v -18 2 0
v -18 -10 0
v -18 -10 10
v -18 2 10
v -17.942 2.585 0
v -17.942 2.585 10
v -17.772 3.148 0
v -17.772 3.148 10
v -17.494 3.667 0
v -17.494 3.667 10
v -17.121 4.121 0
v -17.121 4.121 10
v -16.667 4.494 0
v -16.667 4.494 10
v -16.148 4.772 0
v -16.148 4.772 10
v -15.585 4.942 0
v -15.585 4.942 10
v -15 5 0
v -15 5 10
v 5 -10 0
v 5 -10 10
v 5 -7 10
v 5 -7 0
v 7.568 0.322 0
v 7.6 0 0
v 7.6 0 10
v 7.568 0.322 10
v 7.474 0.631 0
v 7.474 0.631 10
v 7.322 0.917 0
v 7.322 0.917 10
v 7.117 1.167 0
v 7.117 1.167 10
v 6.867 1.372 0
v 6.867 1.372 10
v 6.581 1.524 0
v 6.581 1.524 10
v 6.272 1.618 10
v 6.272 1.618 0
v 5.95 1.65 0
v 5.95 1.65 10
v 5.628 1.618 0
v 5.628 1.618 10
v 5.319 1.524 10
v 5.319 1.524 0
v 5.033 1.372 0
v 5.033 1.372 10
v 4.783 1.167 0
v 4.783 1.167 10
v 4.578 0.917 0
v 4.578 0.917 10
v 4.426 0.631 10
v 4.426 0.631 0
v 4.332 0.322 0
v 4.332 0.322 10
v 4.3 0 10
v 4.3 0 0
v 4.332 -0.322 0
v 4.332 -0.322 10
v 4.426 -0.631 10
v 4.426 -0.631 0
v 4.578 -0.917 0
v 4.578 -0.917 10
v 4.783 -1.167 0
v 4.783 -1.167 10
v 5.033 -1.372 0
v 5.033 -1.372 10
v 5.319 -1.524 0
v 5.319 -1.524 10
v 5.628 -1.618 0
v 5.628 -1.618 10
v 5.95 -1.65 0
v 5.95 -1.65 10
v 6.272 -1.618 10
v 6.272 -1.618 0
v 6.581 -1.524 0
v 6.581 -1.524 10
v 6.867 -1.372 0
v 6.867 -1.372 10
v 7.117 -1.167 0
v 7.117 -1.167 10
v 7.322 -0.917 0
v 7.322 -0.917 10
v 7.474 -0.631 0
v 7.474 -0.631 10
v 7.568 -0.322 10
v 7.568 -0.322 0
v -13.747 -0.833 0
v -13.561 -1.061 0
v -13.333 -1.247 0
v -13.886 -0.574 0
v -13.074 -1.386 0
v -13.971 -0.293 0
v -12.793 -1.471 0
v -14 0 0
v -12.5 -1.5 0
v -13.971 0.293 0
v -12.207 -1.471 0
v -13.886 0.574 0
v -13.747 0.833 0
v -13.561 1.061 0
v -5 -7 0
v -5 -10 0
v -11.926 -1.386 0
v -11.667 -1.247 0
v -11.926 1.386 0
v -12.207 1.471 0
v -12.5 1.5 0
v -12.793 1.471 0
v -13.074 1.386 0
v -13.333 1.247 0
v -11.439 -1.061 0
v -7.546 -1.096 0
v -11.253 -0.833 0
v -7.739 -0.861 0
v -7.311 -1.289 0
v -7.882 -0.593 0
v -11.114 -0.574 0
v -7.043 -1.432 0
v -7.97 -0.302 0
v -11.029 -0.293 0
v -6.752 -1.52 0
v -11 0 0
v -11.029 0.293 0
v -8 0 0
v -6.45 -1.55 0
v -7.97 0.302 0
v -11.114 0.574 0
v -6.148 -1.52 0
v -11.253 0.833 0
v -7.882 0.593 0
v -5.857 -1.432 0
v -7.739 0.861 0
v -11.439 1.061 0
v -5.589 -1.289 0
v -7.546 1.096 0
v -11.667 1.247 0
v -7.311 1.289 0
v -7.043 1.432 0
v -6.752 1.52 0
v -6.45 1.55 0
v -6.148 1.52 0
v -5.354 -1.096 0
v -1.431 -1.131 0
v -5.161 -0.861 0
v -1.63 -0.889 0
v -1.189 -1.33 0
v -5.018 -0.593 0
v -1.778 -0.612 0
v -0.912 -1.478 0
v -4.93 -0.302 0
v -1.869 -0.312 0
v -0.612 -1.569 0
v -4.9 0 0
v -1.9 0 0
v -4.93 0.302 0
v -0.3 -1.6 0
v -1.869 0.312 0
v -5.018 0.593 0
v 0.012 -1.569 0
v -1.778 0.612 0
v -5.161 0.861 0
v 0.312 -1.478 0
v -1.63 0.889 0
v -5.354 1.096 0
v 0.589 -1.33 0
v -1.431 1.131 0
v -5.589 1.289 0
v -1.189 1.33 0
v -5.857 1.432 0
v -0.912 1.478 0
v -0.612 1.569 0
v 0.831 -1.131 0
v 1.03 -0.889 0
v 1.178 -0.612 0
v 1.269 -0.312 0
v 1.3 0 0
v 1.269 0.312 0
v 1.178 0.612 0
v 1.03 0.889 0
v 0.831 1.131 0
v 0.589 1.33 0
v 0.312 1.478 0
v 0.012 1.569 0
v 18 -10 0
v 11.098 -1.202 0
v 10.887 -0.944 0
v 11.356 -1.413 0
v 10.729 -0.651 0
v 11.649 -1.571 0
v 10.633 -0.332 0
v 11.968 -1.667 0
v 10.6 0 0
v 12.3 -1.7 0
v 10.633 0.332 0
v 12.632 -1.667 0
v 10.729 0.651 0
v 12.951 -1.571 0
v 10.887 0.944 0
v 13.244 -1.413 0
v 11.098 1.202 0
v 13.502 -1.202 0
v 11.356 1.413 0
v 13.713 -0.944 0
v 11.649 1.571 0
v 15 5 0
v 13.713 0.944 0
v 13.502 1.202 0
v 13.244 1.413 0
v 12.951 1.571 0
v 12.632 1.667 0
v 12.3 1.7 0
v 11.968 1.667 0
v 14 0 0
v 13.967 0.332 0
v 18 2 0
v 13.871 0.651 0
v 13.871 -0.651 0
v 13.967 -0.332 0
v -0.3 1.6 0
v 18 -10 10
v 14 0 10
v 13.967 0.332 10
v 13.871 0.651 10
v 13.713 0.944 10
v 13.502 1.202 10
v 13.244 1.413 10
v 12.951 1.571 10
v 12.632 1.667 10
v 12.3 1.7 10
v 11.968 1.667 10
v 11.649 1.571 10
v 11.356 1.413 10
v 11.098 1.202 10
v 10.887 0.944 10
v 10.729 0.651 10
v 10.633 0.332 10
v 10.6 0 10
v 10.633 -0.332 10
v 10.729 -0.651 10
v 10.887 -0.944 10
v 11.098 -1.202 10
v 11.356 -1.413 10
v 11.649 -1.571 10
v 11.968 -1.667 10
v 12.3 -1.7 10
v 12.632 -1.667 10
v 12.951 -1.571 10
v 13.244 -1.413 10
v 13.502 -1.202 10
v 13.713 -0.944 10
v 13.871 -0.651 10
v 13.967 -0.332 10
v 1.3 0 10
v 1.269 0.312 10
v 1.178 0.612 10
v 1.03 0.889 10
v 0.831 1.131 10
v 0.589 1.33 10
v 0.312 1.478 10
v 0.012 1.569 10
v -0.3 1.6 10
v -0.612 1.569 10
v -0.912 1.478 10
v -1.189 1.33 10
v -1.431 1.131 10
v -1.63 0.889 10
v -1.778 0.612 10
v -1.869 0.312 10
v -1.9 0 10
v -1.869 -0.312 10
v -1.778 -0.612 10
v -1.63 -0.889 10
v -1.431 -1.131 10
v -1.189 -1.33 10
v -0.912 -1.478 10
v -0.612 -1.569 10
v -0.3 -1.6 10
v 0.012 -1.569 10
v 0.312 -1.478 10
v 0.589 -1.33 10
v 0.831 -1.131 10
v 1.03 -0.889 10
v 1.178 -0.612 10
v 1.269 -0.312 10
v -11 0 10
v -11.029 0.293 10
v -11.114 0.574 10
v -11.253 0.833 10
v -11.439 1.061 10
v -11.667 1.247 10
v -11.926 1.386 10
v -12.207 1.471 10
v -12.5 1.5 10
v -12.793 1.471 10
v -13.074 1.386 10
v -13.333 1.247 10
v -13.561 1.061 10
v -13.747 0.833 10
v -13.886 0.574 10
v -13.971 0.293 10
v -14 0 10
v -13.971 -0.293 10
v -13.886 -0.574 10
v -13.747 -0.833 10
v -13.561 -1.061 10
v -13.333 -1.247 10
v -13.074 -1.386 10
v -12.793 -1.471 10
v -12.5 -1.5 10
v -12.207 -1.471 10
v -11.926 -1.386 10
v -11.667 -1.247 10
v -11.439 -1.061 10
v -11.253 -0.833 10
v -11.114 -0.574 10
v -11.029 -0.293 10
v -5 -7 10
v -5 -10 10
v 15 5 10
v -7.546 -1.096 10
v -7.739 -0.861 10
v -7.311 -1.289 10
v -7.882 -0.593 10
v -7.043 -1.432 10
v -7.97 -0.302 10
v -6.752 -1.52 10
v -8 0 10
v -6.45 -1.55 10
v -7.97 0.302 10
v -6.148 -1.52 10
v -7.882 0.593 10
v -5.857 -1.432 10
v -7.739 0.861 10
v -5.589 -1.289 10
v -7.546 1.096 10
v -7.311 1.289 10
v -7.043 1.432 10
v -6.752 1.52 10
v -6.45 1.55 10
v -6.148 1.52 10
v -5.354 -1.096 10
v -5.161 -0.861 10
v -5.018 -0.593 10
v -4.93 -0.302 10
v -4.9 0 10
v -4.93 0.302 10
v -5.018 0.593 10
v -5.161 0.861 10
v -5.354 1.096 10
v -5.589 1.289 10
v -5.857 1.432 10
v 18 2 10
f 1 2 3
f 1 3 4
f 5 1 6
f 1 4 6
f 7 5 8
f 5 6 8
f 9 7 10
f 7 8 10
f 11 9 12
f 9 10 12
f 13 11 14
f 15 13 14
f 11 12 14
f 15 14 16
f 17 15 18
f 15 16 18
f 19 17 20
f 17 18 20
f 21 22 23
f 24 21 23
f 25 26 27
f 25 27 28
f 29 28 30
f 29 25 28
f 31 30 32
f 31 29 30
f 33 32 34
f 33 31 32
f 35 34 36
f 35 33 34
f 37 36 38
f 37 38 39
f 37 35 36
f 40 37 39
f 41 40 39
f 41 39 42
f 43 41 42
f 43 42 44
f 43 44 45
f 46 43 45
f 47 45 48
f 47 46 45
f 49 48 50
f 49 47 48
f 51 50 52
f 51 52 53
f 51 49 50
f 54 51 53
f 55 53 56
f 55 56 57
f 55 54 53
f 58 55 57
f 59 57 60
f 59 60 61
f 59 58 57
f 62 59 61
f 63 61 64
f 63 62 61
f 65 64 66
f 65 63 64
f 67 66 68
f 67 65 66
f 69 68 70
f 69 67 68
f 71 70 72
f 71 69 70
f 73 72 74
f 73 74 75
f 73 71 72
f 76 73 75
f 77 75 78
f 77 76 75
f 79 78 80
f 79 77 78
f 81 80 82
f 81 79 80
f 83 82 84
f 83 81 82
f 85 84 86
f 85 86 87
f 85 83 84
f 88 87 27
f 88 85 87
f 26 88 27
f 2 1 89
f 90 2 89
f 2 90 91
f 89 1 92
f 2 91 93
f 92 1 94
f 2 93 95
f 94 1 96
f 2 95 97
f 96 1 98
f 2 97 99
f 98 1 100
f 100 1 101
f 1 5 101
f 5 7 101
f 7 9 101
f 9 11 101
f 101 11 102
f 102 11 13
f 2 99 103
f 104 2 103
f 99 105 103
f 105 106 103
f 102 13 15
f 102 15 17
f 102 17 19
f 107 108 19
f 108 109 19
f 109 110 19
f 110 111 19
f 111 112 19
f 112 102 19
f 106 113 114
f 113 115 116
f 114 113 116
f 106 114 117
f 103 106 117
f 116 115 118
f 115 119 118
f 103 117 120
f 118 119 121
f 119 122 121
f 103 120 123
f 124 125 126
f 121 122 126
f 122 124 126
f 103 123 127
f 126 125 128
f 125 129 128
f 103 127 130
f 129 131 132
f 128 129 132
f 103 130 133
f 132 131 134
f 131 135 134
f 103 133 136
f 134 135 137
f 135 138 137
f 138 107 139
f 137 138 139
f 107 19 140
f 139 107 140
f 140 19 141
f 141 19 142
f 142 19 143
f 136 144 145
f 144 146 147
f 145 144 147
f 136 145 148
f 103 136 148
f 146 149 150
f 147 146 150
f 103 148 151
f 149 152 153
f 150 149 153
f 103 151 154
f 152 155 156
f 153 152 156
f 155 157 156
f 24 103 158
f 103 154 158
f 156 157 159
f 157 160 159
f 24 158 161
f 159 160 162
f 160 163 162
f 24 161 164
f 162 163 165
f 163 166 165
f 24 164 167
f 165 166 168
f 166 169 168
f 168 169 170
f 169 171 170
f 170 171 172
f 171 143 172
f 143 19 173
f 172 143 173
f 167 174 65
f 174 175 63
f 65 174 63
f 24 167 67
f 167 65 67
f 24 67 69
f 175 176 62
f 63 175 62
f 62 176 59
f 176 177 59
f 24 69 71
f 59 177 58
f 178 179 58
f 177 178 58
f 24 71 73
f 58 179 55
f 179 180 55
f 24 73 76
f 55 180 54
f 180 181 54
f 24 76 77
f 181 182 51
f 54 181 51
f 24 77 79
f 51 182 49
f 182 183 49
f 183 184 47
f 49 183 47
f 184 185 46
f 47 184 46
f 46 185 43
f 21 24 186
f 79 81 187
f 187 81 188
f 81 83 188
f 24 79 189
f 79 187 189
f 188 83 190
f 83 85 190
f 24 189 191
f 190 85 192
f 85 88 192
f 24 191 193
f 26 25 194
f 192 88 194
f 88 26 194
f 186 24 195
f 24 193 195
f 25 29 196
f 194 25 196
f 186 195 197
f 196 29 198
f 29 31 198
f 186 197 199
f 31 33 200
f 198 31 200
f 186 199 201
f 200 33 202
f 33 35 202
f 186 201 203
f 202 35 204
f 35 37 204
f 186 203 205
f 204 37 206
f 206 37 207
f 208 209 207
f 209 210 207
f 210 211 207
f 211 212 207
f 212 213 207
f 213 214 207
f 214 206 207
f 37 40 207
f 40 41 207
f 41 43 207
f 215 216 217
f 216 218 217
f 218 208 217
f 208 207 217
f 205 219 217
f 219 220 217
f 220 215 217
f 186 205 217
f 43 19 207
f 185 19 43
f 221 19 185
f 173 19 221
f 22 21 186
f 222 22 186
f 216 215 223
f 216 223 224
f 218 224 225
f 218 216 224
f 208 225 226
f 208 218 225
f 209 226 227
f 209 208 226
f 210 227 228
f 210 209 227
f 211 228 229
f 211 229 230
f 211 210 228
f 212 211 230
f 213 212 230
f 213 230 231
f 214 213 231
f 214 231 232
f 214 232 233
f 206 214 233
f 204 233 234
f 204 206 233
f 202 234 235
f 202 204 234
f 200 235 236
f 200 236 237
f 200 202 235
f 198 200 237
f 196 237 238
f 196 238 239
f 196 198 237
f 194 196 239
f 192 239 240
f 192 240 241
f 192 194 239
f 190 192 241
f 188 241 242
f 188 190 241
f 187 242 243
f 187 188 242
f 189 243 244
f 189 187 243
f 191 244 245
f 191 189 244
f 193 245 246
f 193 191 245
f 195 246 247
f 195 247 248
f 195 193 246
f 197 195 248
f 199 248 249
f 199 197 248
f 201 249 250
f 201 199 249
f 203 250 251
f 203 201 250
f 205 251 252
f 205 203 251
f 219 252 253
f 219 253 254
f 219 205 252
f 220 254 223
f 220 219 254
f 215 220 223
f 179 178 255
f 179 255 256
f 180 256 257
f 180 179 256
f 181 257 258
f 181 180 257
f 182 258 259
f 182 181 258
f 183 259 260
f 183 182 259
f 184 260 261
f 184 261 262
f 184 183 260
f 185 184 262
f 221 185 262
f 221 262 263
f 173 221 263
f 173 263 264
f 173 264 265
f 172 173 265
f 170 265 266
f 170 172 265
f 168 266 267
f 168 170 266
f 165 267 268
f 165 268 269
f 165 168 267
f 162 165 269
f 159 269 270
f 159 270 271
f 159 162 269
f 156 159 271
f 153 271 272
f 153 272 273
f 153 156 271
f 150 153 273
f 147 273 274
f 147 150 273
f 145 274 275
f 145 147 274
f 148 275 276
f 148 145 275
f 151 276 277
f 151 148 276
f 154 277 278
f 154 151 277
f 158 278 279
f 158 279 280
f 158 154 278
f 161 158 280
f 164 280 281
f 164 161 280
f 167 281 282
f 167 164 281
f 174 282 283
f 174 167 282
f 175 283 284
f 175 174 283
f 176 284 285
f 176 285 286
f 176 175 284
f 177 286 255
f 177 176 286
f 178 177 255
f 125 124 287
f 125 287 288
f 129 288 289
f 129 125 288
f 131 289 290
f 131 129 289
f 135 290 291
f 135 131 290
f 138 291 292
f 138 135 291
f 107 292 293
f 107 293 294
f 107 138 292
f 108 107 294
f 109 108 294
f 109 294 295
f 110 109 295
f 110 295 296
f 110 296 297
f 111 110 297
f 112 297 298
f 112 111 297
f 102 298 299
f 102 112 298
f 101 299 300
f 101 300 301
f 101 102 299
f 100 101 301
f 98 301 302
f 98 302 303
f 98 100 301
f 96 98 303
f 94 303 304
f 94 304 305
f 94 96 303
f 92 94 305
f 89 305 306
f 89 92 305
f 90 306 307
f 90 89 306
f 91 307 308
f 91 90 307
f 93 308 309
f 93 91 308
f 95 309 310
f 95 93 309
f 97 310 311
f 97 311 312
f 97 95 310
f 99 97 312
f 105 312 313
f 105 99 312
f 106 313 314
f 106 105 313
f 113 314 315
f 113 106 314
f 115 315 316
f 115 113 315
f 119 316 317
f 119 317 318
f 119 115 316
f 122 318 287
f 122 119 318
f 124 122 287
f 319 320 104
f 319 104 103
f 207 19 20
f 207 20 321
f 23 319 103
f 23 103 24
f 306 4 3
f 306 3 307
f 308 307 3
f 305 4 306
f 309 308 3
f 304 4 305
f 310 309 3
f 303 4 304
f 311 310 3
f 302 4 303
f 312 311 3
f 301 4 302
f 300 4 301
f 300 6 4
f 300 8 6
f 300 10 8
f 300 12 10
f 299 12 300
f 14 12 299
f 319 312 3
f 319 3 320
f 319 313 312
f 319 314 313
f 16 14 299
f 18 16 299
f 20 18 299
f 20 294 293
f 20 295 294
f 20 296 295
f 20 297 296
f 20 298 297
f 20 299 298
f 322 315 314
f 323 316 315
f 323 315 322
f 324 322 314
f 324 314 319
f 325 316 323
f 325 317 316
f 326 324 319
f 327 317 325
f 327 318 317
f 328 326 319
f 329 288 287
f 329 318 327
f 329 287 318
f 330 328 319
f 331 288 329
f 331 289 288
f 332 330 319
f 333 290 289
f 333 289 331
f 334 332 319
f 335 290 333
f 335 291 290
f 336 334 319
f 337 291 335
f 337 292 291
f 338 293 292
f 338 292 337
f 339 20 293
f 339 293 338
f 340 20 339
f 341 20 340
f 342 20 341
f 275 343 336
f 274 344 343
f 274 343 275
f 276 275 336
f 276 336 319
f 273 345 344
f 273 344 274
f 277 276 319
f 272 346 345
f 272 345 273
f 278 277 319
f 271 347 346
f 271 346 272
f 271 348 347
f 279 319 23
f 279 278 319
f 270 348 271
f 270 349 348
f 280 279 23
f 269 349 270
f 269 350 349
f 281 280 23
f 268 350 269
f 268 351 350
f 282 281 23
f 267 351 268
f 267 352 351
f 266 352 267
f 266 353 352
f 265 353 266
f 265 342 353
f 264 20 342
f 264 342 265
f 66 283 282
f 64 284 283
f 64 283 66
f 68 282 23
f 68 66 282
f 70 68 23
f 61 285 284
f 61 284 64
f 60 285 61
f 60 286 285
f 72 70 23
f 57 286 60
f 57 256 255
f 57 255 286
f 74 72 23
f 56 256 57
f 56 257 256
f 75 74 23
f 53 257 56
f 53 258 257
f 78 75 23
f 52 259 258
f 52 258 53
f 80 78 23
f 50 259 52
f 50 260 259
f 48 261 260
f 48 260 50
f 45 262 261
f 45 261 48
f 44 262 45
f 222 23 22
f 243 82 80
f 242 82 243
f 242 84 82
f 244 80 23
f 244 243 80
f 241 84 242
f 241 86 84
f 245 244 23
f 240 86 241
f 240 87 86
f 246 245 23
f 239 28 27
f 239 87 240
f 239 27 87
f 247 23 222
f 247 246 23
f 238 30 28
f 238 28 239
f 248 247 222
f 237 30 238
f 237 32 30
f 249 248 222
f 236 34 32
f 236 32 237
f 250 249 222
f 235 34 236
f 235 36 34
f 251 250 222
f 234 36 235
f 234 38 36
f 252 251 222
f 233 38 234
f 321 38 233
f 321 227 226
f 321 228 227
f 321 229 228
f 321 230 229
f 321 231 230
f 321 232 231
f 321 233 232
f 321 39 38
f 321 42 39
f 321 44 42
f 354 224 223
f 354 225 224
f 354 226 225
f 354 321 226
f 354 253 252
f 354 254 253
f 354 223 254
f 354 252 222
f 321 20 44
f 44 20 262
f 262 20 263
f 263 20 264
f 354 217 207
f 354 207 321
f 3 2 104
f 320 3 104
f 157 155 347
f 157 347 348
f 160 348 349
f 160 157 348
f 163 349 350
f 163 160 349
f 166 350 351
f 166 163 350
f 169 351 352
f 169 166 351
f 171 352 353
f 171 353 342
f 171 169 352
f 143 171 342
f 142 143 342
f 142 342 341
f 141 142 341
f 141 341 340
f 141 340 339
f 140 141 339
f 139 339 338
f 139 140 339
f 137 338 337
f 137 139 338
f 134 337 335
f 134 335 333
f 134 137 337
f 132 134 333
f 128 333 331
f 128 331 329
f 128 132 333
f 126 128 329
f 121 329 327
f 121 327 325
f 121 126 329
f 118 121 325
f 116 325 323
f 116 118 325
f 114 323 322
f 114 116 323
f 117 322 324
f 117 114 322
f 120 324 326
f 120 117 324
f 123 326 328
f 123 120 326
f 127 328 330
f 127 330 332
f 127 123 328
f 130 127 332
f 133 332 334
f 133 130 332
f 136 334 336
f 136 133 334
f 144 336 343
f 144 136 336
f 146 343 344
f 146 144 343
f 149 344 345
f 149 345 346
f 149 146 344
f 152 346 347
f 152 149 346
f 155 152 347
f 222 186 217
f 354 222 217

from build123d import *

# Parameters (mm, degrees)
SKETCH1_W           = 36
SKETCH1_H           = 15
SKETCH1_R           = 1.7
SKETCH1_R_2         = 1.65
SKETCH1_R_3         = 1.6
SKETCH1_R_4         = 1.5
SKETCH1_R_5         = 1.55
BOSS_EXTRUDE1_DEPTH = 10
FILLET2_R           = 3
CHAMFER2_SIZE       = 3
SKETCH3_W           = 10
SKETCH3_H           = 6
CUT_EXTRUDE1_DEPTH  = 10


with BuildPart() as part:
    # Sketch1 → Boss-Extrude1 (new body)
    with BuildSketch(Plane.XY):
        with Locations((0, -2.5)):
            Rectangle(SKETCH1_W, SKETCH1_H)
        with Locations((12.3, 0)):
            Circle(SKETCH1_R, mode=Mode.SUBTRACT)
        with Locations((5.95, 0)):
            Circle(SKETCH1_R_2, mode=Mode.SUBTRACT)
        with Locations((-0.3, 0)):
            Circle(SKETCH1_R_3, mode=Mode.SUBTRACT)
        with Locations((-12.5, 0)):
            Circle(SKETCH1_R_4, mode=Mode.SUBTRACT)
        with Locations((-6.45, 0)):
            Circle(SKETCH1_R_5, mode=Mode.SUBTRACT)
    extrude(amount=BOSS_EXTRUDE1_DEPTH)

    # Fillet2
    fillet2_edges = [part.edges().sort_by_distance(p)[0] for p in [
        (-18, 5, 5),
    ]]
    fillet(fillet2_edges, radius=FILLET2_R)

    # Chamfer2
    chamfer2_edges = [part.edges().sort_by_distance(p)[0] for p in [
        (18, 5, 5),
    ]]
    chamfer(chamfer2_edges, length=CHAMFER2_SIZE)

    # Sketch3 → Cut-Extrude1 (cut)
    with BuildSketch(Plane.XY.offset(10)):
        with Locations((0, -10)):
            Rectangle(SKETCH3_W, SKETCH3_H)
    extrude(amount=-CUT_EXTRUDE1_DEPTH, mode=Mode.SUBTRACT)


solid = part.part
